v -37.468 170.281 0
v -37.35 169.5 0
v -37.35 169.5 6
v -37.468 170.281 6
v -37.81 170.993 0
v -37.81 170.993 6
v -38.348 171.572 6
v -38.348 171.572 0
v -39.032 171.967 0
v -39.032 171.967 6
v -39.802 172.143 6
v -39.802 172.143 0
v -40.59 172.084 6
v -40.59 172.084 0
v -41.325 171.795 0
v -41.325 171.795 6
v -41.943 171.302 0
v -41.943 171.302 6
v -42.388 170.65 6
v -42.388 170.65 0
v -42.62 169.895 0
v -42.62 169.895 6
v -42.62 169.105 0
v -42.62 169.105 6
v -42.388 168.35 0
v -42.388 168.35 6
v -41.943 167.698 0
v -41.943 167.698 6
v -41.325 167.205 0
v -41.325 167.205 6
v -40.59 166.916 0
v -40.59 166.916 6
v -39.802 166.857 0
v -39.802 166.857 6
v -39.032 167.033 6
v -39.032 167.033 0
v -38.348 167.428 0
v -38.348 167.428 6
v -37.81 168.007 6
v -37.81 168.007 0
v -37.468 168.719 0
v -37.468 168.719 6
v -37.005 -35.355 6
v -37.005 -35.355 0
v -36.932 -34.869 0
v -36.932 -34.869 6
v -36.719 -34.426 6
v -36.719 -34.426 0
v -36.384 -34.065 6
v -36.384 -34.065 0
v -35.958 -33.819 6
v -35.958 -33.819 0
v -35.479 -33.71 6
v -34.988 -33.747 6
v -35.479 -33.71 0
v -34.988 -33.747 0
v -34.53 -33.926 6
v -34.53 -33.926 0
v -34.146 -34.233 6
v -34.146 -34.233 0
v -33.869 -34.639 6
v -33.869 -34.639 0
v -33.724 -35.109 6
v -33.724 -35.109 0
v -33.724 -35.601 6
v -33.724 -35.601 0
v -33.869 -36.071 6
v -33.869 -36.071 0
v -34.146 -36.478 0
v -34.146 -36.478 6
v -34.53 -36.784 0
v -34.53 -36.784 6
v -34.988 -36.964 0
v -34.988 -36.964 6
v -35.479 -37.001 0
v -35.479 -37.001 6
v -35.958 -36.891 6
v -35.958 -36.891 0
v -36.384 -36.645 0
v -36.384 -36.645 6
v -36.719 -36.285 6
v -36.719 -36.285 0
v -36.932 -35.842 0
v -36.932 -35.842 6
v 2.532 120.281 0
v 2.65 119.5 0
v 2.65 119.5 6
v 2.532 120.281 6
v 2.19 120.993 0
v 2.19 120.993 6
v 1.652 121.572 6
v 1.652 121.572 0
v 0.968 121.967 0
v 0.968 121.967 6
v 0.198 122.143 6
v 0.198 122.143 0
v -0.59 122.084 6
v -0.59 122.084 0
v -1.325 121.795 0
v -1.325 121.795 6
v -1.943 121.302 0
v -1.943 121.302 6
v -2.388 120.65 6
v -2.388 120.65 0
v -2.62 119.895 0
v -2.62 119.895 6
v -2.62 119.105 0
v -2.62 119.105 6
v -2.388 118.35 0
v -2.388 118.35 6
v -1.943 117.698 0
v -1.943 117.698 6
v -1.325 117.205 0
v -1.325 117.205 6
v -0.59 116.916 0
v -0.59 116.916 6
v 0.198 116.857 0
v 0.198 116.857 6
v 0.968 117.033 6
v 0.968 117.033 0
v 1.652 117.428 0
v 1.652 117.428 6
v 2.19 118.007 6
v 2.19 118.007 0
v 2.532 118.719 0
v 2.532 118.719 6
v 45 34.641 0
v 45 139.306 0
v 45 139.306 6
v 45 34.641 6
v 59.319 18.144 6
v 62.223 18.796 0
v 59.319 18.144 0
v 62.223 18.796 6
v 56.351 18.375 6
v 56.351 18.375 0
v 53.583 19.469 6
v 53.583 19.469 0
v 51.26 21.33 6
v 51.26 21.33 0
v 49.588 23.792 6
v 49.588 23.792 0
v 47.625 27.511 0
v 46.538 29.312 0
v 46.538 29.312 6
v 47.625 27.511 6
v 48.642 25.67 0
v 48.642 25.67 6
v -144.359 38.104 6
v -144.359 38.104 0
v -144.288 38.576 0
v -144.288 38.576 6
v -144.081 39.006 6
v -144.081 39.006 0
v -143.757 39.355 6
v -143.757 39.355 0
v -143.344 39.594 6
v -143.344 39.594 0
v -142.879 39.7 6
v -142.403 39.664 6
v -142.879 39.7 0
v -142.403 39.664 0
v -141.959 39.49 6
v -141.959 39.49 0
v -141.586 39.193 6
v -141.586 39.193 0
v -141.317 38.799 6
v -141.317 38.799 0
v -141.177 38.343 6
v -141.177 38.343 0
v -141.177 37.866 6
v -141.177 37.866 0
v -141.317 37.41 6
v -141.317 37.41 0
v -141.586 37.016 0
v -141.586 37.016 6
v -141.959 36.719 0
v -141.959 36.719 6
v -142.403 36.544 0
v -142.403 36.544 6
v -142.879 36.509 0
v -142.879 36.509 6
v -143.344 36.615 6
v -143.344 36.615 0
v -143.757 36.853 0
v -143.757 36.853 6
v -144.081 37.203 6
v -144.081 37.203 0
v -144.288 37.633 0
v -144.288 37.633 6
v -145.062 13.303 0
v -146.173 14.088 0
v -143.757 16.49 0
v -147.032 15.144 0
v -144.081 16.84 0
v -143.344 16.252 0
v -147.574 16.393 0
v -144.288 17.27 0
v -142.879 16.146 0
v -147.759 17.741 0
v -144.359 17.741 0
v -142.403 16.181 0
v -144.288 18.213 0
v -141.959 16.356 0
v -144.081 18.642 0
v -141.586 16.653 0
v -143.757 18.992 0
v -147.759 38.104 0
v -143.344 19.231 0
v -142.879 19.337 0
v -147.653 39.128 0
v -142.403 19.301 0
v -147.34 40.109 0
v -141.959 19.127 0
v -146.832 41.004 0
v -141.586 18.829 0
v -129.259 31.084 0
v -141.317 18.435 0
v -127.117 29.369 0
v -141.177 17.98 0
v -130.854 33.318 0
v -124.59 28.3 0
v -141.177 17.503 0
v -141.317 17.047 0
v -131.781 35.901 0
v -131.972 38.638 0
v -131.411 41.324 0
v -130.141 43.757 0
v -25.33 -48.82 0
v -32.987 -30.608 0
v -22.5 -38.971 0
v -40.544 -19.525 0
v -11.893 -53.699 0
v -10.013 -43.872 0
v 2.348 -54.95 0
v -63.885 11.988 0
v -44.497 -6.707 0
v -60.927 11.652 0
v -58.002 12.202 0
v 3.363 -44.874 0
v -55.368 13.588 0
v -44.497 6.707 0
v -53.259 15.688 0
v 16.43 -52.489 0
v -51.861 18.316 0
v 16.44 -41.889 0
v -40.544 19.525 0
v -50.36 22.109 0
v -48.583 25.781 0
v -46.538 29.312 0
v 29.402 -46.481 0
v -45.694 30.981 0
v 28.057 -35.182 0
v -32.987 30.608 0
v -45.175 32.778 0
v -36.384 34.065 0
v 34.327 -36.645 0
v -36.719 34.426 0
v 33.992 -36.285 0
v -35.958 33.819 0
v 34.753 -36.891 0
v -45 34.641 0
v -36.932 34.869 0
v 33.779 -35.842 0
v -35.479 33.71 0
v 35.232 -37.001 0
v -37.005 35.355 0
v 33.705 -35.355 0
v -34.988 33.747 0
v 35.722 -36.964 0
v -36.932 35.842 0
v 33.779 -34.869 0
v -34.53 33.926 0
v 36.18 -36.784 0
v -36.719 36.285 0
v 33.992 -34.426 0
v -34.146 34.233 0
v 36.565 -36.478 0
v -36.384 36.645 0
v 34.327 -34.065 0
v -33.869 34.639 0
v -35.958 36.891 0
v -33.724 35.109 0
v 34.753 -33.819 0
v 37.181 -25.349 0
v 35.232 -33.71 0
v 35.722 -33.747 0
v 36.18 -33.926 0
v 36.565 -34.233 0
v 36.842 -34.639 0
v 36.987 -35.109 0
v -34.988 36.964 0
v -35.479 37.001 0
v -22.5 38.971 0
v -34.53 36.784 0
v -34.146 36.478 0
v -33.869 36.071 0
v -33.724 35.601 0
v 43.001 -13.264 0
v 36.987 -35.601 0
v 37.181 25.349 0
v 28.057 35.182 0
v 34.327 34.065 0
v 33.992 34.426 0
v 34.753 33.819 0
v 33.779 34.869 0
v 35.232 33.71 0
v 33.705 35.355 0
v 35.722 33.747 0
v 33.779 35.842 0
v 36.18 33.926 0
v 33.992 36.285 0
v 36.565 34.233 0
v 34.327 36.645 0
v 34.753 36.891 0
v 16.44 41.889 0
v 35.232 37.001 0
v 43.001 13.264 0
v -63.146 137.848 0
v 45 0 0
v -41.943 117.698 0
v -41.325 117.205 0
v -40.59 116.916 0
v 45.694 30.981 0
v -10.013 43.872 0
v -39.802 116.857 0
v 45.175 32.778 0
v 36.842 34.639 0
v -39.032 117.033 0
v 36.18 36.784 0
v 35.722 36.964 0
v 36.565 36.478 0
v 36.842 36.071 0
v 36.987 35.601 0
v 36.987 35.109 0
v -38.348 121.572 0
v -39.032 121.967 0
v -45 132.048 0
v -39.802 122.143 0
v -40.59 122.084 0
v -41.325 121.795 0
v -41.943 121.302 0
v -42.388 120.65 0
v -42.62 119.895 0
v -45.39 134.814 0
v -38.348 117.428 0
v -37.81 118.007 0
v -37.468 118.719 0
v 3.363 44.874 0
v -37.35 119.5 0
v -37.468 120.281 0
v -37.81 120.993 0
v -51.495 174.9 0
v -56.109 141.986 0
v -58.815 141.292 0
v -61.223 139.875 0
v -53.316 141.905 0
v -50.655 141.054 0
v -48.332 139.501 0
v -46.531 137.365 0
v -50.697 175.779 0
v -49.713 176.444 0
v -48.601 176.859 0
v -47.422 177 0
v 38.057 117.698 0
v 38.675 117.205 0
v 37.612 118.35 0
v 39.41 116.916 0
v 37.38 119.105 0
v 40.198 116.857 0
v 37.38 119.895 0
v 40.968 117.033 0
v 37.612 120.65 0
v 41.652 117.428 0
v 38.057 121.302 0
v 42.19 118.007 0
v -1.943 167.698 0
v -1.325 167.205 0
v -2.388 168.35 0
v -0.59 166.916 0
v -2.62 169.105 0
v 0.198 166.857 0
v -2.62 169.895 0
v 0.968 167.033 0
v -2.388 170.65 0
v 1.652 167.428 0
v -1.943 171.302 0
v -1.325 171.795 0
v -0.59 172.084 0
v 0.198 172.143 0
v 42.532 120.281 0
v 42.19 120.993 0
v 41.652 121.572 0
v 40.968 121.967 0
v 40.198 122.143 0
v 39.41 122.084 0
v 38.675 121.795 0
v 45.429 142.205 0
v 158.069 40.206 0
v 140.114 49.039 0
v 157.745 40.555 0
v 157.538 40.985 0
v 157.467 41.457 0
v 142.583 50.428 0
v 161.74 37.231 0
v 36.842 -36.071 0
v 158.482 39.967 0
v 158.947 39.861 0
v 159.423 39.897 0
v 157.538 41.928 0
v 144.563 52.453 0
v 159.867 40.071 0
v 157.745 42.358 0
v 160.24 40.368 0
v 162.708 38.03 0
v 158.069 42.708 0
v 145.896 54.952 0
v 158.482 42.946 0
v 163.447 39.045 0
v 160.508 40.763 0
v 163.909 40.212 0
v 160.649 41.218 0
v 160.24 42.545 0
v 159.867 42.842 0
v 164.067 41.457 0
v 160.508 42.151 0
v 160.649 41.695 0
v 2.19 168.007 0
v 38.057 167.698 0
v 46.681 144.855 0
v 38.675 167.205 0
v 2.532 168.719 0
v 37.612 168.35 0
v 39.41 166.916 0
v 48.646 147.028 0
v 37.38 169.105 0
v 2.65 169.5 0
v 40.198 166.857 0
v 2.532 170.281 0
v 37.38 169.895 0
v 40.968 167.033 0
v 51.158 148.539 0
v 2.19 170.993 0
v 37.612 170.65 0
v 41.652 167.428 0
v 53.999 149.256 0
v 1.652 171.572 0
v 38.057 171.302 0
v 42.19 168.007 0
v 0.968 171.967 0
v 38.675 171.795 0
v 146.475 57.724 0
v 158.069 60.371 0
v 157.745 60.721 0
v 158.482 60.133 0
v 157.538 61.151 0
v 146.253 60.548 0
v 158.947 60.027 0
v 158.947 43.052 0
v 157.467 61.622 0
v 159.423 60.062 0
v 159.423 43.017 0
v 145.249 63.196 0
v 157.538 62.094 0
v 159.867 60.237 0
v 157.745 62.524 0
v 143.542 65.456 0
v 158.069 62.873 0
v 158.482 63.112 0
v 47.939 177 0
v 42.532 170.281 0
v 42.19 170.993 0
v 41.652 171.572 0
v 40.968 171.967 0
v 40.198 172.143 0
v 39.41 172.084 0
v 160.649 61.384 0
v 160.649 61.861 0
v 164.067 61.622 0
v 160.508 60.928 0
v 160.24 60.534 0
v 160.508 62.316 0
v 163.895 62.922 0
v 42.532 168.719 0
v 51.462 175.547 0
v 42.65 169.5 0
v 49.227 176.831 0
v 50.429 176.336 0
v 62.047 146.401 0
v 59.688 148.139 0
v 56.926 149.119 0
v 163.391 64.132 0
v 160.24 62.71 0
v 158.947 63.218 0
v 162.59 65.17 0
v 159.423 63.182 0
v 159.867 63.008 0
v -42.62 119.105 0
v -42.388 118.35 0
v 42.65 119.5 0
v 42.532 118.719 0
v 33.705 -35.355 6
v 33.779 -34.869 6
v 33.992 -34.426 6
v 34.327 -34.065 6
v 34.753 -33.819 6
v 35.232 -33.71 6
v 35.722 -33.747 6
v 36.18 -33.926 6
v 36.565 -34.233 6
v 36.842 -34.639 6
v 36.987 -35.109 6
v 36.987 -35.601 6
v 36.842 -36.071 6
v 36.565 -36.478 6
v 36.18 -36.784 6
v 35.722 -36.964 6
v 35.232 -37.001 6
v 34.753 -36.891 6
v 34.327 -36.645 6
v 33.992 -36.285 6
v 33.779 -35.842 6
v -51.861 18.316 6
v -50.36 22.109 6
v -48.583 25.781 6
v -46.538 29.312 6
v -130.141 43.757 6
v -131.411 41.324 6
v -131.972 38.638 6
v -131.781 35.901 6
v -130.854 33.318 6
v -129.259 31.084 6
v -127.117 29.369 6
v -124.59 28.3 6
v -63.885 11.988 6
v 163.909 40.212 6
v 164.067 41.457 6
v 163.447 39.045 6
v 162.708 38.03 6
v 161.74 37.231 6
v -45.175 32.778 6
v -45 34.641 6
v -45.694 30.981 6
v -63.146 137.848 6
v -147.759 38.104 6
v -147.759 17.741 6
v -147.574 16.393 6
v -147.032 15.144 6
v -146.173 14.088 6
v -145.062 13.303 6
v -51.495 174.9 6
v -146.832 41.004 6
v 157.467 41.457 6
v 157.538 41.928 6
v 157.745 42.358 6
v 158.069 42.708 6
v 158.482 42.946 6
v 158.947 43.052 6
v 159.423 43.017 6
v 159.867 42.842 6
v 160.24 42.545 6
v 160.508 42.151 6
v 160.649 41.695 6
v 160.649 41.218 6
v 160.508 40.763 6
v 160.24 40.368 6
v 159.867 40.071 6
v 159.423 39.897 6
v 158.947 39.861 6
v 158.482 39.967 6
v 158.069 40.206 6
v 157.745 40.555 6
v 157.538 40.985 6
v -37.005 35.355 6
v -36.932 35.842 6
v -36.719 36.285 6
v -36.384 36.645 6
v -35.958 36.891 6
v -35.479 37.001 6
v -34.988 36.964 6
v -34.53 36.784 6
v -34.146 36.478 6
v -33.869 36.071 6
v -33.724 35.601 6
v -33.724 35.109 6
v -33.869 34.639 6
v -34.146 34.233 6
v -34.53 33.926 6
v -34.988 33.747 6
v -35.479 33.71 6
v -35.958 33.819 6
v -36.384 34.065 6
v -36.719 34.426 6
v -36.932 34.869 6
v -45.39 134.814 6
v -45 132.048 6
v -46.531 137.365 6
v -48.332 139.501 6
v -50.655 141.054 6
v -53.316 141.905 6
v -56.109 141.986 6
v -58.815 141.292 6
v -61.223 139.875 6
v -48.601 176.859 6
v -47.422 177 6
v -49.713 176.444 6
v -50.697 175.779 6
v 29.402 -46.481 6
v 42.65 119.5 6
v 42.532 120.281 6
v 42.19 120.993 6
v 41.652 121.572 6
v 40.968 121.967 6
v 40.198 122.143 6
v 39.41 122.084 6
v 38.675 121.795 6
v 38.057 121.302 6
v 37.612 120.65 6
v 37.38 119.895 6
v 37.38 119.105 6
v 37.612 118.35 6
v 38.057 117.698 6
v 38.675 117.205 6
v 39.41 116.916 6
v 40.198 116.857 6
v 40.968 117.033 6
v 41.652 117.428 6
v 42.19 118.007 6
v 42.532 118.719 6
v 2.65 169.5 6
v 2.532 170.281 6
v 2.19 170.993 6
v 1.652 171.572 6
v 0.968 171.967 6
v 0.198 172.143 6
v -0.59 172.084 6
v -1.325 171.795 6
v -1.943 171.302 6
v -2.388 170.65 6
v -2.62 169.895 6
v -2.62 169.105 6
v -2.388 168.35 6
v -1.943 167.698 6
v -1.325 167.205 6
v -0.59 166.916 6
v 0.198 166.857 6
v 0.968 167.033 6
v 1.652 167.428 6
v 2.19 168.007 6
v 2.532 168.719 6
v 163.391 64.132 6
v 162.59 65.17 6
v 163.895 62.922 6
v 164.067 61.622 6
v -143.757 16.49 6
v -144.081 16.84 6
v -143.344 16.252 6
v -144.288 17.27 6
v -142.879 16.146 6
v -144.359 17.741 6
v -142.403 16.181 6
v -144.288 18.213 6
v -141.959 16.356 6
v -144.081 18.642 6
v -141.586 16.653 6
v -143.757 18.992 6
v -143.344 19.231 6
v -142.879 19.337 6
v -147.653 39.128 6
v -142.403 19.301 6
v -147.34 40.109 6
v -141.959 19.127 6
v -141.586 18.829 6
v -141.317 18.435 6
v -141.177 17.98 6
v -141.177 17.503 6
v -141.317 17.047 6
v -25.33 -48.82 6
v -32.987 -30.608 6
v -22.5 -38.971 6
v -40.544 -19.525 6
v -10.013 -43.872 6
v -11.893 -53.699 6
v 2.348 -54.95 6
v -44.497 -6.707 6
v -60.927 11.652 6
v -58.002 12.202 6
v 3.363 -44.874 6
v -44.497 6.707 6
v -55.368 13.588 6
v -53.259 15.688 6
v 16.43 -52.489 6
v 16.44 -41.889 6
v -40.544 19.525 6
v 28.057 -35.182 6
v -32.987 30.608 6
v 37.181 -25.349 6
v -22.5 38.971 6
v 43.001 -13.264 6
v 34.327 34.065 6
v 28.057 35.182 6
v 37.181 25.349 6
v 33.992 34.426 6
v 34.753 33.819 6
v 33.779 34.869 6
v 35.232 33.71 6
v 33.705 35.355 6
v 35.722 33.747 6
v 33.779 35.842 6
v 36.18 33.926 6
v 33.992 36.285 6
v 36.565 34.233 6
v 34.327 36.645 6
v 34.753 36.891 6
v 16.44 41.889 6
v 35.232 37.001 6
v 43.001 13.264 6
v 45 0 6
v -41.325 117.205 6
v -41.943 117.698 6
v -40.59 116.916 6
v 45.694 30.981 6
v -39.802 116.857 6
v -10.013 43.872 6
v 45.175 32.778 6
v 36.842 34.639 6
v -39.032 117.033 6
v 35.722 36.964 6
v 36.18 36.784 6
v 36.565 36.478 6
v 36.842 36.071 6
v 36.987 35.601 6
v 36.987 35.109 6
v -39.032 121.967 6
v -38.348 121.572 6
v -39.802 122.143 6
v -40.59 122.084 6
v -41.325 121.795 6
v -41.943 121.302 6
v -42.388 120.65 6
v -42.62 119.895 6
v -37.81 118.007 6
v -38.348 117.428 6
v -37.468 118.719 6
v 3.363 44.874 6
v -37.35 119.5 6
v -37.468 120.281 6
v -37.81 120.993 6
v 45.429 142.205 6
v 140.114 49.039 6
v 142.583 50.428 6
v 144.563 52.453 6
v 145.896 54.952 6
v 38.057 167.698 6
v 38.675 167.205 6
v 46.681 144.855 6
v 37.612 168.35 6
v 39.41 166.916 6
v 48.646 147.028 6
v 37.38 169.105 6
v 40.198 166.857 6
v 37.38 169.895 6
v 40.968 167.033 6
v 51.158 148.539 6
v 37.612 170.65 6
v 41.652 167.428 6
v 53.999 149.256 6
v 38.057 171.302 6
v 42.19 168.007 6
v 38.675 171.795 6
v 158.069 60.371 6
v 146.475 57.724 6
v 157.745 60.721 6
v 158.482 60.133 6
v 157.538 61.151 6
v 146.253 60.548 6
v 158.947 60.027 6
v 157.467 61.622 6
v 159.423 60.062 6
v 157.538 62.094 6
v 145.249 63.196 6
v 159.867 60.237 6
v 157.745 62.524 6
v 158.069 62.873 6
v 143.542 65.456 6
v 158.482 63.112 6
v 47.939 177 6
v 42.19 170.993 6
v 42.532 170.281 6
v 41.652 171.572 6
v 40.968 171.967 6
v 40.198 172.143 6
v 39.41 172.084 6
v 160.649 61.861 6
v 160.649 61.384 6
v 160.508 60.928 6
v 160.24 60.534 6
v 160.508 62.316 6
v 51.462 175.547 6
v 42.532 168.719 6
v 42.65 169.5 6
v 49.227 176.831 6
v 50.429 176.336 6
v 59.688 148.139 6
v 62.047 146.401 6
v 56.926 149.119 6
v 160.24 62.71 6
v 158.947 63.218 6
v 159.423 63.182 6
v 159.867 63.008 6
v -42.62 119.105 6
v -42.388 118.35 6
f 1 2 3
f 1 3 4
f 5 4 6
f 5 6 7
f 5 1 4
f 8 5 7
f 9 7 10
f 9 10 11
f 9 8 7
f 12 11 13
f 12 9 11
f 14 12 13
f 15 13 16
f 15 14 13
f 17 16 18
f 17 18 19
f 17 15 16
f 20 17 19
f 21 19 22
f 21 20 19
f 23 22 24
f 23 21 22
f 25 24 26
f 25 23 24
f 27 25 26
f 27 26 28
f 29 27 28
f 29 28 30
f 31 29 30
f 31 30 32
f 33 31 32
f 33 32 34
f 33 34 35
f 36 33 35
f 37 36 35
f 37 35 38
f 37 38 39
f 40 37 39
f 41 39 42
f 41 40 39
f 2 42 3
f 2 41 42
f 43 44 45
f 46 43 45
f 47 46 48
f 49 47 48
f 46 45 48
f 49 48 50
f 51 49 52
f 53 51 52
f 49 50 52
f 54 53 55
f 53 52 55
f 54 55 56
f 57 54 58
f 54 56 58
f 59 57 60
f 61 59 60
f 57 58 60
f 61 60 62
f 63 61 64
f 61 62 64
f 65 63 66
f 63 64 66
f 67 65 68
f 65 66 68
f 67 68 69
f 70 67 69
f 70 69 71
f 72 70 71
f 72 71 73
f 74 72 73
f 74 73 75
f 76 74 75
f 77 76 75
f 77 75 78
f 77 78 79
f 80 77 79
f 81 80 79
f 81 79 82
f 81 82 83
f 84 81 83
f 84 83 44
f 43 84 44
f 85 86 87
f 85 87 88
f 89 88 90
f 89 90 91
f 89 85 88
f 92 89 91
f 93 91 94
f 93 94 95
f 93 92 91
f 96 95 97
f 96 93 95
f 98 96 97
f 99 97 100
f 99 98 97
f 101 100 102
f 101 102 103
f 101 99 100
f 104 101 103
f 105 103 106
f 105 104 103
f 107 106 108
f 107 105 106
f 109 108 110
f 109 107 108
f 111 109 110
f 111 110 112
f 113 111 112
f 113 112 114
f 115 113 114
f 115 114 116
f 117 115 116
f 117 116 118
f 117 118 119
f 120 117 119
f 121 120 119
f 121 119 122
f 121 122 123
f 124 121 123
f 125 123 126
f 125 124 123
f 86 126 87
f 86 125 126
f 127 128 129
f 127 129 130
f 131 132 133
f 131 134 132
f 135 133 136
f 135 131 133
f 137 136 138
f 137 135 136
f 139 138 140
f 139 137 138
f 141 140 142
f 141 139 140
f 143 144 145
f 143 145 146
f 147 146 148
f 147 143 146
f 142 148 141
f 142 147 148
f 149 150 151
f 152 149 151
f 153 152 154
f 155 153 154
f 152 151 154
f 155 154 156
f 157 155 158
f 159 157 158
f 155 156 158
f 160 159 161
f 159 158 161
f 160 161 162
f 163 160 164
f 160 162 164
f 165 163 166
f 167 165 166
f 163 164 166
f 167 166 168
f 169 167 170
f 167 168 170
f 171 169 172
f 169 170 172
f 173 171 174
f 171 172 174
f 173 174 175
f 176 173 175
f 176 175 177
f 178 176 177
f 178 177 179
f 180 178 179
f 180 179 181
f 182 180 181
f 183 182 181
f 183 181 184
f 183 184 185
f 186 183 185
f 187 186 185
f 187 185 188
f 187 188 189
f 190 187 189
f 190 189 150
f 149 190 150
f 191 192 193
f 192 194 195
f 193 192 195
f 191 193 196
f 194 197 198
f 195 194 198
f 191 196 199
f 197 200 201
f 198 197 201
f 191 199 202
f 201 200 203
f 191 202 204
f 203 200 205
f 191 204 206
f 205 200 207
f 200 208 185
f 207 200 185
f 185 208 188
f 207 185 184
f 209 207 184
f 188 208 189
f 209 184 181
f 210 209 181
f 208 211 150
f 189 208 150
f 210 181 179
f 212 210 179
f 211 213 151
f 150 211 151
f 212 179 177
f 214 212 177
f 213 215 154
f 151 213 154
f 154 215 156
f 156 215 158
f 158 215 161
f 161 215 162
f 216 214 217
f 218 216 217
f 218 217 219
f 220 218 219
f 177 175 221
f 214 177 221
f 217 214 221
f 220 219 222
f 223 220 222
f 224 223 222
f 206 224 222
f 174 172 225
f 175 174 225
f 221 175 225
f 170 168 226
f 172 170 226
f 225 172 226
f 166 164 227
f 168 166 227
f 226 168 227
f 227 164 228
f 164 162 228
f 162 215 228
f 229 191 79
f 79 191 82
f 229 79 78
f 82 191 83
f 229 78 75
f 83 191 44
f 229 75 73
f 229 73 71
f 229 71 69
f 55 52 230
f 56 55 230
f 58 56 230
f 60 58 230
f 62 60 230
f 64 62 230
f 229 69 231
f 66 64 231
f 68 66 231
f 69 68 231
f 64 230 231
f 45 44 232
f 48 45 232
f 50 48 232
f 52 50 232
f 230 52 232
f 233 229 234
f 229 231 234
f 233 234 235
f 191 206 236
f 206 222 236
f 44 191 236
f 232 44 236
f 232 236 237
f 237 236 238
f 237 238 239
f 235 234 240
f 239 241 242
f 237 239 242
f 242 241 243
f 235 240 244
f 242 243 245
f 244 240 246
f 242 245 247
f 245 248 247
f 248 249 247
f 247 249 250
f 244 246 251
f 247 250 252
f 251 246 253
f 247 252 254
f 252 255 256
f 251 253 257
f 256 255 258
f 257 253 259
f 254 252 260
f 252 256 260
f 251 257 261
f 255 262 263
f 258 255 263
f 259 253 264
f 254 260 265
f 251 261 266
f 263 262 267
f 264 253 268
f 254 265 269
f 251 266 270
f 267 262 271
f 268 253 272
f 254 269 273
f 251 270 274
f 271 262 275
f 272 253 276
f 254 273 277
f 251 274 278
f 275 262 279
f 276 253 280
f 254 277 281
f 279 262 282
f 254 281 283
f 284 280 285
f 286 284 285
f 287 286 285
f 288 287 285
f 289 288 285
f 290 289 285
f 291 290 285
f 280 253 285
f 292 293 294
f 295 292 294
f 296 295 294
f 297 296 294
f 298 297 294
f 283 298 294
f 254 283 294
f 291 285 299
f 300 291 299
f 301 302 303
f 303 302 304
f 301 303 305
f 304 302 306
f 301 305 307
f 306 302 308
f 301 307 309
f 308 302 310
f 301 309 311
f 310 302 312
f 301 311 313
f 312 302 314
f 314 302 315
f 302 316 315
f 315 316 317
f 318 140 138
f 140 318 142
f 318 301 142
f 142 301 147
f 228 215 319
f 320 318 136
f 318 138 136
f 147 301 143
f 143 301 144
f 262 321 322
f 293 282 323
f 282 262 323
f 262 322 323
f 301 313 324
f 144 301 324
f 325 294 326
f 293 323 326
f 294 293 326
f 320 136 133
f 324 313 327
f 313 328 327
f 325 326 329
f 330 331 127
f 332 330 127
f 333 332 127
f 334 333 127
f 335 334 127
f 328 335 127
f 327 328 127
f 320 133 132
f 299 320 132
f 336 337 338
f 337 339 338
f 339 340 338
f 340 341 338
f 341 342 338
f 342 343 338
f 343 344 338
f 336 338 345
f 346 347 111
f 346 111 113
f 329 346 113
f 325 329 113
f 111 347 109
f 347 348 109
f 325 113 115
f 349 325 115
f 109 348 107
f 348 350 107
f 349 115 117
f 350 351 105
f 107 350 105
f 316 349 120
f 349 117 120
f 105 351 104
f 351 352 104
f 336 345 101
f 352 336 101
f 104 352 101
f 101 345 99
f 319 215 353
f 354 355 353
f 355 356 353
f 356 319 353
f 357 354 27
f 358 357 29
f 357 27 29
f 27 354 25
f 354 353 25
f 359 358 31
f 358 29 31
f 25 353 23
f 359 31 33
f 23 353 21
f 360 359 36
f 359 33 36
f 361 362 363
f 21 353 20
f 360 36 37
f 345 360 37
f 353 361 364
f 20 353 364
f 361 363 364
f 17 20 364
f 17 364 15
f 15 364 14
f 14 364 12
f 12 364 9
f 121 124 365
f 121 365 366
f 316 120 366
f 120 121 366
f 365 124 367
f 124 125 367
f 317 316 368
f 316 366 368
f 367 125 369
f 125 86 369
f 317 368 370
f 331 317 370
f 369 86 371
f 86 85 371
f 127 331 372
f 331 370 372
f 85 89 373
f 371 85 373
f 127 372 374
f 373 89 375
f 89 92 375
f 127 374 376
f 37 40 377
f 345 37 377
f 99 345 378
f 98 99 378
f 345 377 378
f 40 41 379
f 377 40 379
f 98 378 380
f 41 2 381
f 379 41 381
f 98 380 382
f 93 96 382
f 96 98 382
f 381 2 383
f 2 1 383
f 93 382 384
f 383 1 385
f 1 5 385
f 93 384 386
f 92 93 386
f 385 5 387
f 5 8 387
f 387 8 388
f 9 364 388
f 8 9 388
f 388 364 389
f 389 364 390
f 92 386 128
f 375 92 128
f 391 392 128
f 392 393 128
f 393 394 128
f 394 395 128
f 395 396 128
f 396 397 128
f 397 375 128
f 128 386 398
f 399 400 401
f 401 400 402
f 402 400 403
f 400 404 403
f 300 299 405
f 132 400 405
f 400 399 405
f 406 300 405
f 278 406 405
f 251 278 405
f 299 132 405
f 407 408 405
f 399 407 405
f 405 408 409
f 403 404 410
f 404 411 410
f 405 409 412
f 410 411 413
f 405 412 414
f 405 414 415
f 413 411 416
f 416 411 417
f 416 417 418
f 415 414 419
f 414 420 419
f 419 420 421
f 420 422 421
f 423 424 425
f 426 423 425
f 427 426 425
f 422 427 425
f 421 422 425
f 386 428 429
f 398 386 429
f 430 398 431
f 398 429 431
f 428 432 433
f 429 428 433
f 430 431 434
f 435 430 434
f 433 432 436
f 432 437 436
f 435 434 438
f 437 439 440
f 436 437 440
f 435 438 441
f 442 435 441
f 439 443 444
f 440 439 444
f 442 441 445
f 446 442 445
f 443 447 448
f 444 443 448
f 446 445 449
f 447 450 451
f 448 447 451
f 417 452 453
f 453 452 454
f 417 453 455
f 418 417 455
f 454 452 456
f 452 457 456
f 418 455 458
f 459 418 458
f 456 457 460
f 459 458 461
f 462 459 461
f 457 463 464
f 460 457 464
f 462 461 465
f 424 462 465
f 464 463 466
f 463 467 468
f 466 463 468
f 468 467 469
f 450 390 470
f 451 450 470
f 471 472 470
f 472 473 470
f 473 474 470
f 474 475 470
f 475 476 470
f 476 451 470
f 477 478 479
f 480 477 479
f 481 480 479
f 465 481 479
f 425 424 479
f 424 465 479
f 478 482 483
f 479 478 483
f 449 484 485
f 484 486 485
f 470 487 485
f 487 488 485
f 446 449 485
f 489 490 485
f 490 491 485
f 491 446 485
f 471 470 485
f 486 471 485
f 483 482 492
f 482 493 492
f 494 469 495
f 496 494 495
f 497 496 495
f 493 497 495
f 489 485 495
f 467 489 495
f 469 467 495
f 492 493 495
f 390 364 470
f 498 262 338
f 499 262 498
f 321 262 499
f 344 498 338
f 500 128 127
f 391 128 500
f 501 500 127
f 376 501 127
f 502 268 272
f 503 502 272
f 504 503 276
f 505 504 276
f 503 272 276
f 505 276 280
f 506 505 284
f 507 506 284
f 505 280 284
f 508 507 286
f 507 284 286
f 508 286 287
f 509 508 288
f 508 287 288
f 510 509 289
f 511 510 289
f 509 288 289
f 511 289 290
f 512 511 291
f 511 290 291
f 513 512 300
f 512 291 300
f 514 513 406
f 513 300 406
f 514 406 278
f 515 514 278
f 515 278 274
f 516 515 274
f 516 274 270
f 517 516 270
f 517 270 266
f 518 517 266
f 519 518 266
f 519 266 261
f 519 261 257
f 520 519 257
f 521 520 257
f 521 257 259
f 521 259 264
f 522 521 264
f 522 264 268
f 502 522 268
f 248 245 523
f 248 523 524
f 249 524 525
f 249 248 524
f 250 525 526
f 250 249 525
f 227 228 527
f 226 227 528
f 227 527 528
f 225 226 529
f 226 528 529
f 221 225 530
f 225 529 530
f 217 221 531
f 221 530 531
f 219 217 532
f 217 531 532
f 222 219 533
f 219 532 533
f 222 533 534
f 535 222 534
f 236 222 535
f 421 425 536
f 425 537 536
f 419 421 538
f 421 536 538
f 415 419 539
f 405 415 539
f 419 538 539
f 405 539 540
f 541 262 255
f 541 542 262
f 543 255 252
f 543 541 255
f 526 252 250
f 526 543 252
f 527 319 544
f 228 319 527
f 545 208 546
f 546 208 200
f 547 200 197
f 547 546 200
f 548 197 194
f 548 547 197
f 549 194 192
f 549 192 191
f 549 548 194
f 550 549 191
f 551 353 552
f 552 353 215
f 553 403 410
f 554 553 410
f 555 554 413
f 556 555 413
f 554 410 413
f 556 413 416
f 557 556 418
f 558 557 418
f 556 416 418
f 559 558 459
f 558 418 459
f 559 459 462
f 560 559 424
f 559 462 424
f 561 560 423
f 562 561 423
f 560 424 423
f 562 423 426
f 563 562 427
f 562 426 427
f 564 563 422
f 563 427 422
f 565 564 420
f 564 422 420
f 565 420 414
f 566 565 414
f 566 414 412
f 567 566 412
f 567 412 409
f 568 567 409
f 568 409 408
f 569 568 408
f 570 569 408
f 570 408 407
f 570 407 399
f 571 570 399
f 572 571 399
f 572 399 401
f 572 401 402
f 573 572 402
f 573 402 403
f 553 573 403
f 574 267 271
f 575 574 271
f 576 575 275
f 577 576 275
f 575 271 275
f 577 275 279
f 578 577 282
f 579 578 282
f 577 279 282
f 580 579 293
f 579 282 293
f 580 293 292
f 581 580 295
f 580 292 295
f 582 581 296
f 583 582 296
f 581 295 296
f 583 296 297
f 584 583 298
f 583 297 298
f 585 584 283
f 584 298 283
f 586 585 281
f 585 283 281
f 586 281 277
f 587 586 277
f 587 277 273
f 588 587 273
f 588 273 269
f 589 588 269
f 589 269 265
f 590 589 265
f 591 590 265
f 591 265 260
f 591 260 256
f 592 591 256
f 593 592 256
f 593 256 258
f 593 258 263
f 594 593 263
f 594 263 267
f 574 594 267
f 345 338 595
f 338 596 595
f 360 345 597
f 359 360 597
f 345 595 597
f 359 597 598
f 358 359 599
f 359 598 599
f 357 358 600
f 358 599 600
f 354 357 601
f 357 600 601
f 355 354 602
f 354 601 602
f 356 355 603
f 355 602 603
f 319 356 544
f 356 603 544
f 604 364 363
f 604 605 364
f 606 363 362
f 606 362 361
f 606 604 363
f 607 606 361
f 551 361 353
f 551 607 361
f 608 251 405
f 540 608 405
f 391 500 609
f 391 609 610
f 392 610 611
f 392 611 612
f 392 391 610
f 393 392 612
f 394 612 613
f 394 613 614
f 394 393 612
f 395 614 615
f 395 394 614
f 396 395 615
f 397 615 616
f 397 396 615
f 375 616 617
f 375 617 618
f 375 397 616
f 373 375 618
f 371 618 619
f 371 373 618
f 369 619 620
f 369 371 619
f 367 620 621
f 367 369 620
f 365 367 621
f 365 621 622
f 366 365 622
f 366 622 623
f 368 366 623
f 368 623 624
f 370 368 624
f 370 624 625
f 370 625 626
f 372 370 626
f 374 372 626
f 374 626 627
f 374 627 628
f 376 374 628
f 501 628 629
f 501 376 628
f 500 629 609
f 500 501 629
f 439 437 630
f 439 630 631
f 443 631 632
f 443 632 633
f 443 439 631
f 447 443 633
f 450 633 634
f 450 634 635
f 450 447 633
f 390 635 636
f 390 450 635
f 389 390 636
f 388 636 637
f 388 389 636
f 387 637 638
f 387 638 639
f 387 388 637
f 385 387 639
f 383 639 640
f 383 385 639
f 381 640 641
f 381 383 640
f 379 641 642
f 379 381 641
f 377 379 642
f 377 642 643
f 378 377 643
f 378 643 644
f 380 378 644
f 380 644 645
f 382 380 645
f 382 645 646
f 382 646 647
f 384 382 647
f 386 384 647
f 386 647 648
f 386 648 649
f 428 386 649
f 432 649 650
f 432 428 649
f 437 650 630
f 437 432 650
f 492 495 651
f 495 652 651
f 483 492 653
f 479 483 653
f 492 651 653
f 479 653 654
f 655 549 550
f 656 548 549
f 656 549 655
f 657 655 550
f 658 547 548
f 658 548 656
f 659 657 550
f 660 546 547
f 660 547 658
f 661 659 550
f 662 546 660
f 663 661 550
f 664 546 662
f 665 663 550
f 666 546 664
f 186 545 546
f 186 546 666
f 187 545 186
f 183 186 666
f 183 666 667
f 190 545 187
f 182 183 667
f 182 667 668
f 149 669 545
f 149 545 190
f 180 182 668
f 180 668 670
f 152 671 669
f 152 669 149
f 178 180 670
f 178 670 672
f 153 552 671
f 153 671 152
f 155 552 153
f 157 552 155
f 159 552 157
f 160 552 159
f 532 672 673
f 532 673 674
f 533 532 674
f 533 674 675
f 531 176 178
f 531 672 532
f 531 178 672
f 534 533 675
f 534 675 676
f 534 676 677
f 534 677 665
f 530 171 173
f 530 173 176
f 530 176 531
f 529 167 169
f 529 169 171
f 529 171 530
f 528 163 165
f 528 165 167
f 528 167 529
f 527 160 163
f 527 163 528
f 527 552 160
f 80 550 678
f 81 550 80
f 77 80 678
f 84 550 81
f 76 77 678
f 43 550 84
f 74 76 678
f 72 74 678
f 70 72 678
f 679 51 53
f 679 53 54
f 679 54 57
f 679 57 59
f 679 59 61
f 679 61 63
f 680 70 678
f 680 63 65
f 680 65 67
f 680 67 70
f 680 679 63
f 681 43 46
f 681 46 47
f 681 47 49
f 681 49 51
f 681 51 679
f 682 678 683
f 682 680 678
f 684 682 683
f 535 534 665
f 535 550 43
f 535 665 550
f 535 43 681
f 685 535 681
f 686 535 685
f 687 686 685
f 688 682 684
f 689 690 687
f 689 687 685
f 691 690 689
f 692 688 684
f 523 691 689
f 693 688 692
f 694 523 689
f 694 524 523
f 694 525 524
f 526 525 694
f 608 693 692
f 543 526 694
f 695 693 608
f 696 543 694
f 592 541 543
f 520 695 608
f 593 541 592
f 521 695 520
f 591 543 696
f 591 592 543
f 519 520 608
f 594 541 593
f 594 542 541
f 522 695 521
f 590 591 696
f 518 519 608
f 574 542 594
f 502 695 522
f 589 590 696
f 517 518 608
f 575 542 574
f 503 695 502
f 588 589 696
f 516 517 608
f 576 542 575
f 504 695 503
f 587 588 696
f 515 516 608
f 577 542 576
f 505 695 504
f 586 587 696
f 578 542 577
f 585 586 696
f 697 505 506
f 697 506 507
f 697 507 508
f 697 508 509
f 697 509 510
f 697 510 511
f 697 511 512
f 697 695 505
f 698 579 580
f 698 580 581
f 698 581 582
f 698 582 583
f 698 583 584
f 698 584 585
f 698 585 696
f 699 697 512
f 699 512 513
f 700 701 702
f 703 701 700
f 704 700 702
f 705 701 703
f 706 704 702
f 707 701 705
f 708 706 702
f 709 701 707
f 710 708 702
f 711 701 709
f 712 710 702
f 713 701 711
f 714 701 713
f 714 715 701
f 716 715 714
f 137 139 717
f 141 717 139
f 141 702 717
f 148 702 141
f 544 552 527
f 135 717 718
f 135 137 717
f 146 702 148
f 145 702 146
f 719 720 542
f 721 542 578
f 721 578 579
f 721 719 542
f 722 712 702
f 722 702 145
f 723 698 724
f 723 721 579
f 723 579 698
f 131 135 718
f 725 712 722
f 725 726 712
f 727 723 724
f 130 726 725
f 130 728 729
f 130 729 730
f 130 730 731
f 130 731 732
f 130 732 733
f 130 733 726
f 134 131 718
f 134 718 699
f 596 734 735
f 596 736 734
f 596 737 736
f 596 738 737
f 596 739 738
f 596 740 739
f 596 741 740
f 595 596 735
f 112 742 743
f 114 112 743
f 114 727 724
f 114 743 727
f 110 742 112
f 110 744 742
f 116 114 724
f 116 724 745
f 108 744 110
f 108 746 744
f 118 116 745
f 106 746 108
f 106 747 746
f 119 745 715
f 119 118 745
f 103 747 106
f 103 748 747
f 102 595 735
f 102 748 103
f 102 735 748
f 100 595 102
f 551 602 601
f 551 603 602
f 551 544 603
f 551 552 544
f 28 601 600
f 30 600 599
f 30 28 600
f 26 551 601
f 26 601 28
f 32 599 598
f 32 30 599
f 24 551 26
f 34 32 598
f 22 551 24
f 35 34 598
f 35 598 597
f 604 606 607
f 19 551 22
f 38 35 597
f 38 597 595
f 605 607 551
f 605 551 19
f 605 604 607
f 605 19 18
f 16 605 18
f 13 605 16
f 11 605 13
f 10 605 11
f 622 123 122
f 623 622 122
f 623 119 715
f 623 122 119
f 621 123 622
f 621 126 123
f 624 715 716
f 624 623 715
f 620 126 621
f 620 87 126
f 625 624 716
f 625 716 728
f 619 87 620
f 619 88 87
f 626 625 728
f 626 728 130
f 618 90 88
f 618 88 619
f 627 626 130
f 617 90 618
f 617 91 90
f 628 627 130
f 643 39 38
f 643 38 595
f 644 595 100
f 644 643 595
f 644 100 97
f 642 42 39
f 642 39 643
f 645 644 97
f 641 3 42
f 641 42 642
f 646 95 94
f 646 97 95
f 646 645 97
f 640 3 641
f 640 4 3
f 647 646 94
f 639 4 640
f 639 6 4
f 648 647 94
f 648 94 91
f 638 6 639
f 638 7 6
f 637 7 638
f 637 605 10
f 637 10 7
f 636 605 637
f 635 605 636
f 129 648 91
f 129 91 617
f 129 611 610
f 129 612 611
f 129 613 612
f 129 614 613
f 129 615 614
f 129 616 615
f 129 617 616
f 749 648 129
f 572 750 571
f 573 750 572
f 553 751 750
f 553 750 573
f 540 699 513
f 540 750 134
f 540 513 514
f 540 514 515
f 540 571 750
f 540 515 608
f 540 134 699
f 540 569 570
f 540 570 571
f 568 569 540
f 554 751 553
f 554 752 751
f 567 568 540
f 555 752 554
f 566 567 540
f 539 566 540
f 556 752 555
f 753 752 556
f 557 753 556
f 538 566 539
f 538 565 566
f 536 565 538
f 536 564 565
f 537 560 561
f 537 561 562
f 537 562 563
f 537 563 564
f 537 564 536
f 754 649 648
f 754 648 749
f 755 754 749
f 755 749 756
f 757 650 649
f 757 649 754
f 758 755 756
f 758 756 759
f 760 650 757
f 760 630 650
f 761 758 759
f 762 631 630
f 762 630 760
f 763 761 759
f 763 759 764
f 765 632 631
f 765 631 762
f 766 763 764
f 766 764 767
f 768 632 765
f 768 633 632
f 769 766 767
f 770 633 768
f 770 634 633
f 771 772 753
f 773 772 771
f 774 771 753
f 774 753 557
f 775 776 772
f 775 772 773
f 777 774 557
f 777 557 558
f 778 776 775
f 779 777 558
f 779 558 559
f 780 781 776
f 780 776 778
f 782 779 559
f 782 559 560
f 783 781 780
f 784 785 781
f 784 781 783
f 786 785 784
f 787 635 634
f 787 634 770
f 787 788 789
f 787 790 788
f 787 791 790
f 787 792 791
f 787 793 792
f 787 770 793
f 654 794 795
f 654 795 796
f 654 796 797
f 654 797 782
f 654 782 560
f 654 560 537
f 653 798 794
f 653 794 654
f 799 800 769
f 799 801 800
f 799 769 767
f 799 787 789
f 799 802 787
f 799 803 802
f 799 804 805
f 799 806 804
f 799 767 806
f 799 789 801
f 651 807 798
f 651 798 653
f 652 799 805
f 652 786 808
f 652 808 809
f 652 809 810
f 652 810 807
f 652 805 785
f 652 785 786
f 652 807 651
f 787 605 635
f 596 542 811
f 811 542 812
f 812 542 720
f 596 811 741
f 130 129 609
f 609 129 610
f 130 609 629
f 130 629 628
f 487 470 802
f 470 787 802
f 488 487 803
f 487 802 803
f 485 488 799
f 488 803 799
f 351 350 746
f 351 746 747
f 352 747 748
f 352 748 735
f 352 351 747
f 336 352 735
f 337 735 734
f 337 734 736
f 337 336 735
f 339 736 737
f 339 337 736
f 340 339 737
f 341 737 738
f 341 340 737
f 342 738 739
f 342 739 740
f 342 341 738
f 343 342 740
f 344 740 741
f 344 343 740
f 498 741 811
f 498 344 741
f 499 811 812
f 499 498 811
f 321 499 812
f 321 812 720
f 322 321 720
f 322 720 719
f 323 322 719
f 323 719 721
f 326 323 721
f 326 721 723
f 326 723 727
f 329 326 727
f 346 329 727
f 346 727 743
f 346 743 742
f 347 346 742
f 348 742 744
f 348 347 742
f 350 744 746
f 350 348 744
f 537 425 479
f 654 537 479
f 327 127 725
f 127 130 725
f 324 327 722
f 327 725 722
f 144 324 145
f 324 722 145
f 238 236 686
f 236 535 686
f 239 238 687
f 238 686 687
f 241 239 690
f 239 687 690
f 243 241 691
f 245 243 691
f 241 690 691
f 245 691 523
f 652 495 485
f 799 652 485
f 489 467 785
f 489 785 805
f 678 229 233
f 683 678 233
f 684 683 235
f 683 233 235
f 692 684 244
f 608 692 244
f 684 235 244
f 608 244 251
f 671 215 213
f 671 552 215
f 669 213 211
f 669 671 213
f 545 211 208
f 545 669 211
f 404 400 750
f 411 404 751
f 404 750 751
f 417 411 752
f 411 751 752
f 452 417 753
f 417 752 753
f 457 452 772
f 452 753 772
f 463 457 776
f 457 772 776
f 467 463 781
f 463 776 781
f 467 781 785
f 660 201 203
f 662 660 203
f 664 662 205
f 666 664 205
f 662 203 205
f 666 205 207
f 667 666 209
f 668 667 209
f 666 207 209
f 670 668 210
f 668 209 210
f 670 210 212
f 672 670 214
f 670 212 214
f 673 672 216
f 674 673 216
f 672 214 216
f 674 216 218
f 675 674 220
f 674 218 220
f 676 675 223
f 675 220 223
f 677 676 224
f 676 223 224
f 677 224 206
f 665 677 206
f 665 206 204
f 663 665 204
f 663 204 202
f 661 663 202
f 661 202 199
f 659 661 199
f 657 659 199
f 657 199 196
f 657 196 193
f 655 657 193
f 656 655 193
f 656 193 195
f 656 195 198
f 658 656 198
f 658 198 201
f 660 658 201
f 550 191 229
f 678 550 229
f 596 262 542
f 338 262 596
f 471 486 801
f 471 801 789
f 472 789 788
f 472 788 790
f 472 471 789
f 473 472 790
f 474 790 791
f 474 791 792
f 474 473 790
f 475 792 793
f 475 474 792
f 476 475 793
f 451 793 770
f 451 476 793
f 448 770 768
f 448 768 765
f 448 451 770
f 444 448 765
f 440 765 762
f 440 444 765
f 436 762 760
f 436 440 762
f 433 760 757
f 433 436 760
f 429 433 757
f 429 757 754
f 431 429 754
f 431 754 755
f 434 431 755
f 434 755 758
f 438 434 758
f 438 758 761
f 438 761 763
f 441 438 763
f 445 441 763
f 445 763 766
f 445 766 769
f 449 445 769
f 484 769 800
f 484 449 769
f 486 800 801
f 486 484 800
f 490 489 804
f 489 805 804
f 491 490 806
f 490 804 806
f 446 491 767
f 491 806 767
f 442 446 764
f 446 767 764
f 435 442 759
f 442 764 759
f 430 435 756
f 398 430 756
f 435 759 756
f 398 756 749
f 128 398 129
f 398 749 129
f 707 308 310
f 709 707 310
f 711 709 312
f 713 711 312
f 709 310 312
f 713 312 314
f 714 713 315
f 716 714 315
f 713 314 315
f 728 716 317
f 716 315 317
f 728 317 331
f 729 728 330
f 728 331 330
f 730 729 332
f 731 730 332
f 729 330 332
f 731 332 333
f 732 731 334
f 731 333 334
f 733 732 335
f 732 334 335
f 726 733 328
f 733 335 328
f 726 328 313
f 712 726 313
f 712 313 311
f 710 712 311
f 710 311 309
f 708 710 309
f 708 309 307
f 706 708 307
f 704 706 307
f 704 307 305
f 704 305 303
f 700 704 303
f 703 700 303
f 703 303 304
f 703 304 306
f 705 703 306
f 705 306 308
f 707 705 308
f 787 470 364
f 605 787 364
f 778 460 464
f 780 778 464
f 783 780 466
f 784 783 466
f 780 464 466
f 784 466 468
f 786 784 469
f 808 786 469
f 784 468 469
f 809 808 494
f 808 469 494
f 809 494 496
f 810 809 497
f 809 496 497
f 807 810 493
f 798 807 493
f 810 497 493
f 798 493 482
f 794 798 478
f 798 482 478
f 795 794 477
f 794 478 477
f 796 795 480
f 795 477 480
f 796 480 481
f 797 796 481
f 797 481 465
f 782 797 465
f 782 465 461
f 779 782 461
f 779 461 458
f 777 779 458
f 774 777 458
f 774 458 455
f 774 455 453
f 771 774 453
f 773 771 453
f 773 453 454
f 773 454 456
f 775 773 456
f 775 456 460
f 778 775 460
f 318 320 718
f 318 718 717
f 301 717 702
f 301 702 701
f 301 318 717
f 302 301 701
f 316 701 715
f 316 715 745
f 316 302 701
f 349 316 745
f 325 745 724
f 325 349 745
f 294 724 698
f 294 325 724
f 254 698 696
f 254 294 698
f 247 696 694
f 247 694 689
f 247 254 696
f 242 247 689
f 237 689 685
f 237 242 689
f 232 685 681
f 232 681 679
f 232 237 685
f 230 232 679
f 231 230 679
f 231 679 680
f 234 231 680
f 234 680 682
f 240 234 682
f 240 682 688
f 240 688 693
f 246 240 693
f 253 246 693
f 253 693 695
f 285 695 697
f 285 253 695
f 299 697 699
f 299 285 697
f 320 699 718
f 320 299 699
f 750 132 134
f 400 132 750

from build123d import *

# Parameters (mm, degrees)
SKETCH8_R           = 45
SKETCH8_R_2         = 2.65
BOSS_EXTRUDE4_DEPTH = 6
SKETCH9_R           = 1.65
CUT_EXTRUDE1_DEPTH  = 242.418521502
CUT_EXTRUDE2_DEPTH  = 242.418521502
FILLET2_R           = 10
FILLET3_R           = 5
SKETCH11_R          = 1.6
CUT_EXTRUDE3_DEPTH  = 242.418521502


with BuildPart() as part:
    # Sketch8 → Boss-Extrude4 (new body)
    with BuildSketch(Plane.XY):
        with BuildLine():
            Line((50, 177), (-50, 177))
            Line((-50, 177), (-147.758969873, 39.702478789))
            Line((-147.758969873, 39.702478789), (-147.758969873, 14.702478789))
            Line((-147.758969873, 14.702478789), (-25.330258141, -48.81985275))
            ThreePointArc((-25.330258141, -48.81985275), (2.348008246, -54.949857664), (29.402470247, -46.481122441))
            Line((29.402470247, -46.481122441), (164.066762399, 38.703198318))
            Line((164.066762399, 38.703198318), (164.066762399, 63.703198318))
            Line((164.066762399, 63.703198318), (50, 177))
        make_face()
        Circle(SKETCH8_R, mode=Mode.SUBTRACT)
        with Locations((-40, 169.5)):
            Circle(SKETCH8_R_2, mode=Mode.SUBTRACT)
        with Locations((40, 169.5)):
            Circle(SKETCH8_R_2, mode=Mode.SUBTRACT)
        with Locations((0, 169.5)):
            Circle(SKETCH8_R_2, mode=Mode.SUBTRACT)
        with Locations((40, 119.5)):
            Circle(SKETCH8_R_2, mode=Mode.SUBTRACT)
        with Locations((0, 119.5)):
            Circle(SKETCH8_R_2, mode=Mode.SUBTRACT)
        with Locations((-40, 119.5)):
            Circle(SKETCH8_R_2, mode=Mode.SUBTRACT)
    extrude(amount=BOSS_EXTRUDE4_DEPTH)

    # Sketch9 → Cut-Extrude1 (cut, through all)
    with BuildSketch(Plane(origin=(0, 0, 0), x_dir=(-1, 0, 0), z_dir=(0, 0, -1))):
        with Locations((35.355339059, -35.355339059)):
            Circle(SKETCH9_R)
        with Locations((-35.355339059, -35.355339059)):
            Circle(SKETCH9_R)
        with Locations((-35.355339059, 35.355339059)):
            Circle(SKETCH9_R)
        with Locations((35.355339059, 35.355339059)):
            Circle(SKETCH9_R)
    extrude(amount=-CUT_EXTRUDE1_DEPTH, mode=Mode.SUBTRACT)

    # Sketch10 → Cut-Extrude2 (cut, through all)
    with BuildSketch(Plane(origin=(0, 0, 0), x_dir=(-1, 0, 0), z_dir=(0, 0, -1))):
        with BuildLine():
            Line((45, 31.622776602), (45, 163.333195837))
            Line((45, 163.333195837), (138.48799676, 32.034040017))
            Line((138.48799676, 32.034040017), (54.193493342, 9.38431028))
            ThreePointArc((54.193493342, 9.38431028), (50.827892209, 21.012505171), (45, 31.622776602))
        make_face()
        with BuildLine():
            Line((-52.868310579, 15.163829877), (-154.461888015, 54.610185231))
            Line((-154.461888015, 54.610185231), (-45, 163.333195837))
            Line((-45, 163.333195837), (-45, 31.622776602))
            ThreePointArc((-45, 31.622776602), (-49.621323901, 23.721808833), (-52.868310579, 15.163829877))
        make_face()
    extrude(amount=-CUT_EXTRUDE2_DEPTH, mode=Mode.SUBTRACT)

    # Fillet2
    fillet2_edges = [part.edges().sort_by_distance(p)[0] for p in [
        (-54.193493342, 9.38431028, 3),
        (-45, 31.622776602, 3),
        (-45, 163.333195837, 3),
        (-138.48799676, 32.034040017, 3),
        (45, 31.622776602, 3),
        (52.868310579, 15.163829877, 3),
        (154.461888015, 54.610185231, 3),
        (45, 163.333195837, 3),
    ]]
    fillet(fillet2_edges, radius=FILLET2_R)

    # Fillet3
    fillet3_edges = [part.edges().sort_by_distance(p)[0] for p in [
        (-147.758969873, 39.702478789, 3),
        (-50, 177, 3),
        (50, 177, 3),
        (164.066762399, 63.703198318, 3),
        (164.066762399, 38.703198318, 3),
        (-147.758969873, 14.702478789, 3),
    ]]
    fillet(fillet3_edges, radius=FILLET3_R)

    # Sketch11 → Cut-Extrude3 (cut, through all)
    with BuildSketch(Plane(origin=(0, 0, 0), x_dir=(-1, 0, 0), z_dir=(0, 0, -1))):
        with Locations((142.758969873, 38.104287644)):
            Circle(SKETCH11_R)
        with Locations((142.758969873, 17.741175158)):
            Circle(SKETCH11_R)
        with Locations((-159.066762399, 61.622204822)):
            Circle(SKETCH11_R)
        with Locations((-159.066762399, 41.456738724)):
            Circle(SKETCH11_R)
    extrude(amount=-CUT_EXTRUDE3_DEPTH, mode=Mode.SUBTRACT)


solid = part.part
